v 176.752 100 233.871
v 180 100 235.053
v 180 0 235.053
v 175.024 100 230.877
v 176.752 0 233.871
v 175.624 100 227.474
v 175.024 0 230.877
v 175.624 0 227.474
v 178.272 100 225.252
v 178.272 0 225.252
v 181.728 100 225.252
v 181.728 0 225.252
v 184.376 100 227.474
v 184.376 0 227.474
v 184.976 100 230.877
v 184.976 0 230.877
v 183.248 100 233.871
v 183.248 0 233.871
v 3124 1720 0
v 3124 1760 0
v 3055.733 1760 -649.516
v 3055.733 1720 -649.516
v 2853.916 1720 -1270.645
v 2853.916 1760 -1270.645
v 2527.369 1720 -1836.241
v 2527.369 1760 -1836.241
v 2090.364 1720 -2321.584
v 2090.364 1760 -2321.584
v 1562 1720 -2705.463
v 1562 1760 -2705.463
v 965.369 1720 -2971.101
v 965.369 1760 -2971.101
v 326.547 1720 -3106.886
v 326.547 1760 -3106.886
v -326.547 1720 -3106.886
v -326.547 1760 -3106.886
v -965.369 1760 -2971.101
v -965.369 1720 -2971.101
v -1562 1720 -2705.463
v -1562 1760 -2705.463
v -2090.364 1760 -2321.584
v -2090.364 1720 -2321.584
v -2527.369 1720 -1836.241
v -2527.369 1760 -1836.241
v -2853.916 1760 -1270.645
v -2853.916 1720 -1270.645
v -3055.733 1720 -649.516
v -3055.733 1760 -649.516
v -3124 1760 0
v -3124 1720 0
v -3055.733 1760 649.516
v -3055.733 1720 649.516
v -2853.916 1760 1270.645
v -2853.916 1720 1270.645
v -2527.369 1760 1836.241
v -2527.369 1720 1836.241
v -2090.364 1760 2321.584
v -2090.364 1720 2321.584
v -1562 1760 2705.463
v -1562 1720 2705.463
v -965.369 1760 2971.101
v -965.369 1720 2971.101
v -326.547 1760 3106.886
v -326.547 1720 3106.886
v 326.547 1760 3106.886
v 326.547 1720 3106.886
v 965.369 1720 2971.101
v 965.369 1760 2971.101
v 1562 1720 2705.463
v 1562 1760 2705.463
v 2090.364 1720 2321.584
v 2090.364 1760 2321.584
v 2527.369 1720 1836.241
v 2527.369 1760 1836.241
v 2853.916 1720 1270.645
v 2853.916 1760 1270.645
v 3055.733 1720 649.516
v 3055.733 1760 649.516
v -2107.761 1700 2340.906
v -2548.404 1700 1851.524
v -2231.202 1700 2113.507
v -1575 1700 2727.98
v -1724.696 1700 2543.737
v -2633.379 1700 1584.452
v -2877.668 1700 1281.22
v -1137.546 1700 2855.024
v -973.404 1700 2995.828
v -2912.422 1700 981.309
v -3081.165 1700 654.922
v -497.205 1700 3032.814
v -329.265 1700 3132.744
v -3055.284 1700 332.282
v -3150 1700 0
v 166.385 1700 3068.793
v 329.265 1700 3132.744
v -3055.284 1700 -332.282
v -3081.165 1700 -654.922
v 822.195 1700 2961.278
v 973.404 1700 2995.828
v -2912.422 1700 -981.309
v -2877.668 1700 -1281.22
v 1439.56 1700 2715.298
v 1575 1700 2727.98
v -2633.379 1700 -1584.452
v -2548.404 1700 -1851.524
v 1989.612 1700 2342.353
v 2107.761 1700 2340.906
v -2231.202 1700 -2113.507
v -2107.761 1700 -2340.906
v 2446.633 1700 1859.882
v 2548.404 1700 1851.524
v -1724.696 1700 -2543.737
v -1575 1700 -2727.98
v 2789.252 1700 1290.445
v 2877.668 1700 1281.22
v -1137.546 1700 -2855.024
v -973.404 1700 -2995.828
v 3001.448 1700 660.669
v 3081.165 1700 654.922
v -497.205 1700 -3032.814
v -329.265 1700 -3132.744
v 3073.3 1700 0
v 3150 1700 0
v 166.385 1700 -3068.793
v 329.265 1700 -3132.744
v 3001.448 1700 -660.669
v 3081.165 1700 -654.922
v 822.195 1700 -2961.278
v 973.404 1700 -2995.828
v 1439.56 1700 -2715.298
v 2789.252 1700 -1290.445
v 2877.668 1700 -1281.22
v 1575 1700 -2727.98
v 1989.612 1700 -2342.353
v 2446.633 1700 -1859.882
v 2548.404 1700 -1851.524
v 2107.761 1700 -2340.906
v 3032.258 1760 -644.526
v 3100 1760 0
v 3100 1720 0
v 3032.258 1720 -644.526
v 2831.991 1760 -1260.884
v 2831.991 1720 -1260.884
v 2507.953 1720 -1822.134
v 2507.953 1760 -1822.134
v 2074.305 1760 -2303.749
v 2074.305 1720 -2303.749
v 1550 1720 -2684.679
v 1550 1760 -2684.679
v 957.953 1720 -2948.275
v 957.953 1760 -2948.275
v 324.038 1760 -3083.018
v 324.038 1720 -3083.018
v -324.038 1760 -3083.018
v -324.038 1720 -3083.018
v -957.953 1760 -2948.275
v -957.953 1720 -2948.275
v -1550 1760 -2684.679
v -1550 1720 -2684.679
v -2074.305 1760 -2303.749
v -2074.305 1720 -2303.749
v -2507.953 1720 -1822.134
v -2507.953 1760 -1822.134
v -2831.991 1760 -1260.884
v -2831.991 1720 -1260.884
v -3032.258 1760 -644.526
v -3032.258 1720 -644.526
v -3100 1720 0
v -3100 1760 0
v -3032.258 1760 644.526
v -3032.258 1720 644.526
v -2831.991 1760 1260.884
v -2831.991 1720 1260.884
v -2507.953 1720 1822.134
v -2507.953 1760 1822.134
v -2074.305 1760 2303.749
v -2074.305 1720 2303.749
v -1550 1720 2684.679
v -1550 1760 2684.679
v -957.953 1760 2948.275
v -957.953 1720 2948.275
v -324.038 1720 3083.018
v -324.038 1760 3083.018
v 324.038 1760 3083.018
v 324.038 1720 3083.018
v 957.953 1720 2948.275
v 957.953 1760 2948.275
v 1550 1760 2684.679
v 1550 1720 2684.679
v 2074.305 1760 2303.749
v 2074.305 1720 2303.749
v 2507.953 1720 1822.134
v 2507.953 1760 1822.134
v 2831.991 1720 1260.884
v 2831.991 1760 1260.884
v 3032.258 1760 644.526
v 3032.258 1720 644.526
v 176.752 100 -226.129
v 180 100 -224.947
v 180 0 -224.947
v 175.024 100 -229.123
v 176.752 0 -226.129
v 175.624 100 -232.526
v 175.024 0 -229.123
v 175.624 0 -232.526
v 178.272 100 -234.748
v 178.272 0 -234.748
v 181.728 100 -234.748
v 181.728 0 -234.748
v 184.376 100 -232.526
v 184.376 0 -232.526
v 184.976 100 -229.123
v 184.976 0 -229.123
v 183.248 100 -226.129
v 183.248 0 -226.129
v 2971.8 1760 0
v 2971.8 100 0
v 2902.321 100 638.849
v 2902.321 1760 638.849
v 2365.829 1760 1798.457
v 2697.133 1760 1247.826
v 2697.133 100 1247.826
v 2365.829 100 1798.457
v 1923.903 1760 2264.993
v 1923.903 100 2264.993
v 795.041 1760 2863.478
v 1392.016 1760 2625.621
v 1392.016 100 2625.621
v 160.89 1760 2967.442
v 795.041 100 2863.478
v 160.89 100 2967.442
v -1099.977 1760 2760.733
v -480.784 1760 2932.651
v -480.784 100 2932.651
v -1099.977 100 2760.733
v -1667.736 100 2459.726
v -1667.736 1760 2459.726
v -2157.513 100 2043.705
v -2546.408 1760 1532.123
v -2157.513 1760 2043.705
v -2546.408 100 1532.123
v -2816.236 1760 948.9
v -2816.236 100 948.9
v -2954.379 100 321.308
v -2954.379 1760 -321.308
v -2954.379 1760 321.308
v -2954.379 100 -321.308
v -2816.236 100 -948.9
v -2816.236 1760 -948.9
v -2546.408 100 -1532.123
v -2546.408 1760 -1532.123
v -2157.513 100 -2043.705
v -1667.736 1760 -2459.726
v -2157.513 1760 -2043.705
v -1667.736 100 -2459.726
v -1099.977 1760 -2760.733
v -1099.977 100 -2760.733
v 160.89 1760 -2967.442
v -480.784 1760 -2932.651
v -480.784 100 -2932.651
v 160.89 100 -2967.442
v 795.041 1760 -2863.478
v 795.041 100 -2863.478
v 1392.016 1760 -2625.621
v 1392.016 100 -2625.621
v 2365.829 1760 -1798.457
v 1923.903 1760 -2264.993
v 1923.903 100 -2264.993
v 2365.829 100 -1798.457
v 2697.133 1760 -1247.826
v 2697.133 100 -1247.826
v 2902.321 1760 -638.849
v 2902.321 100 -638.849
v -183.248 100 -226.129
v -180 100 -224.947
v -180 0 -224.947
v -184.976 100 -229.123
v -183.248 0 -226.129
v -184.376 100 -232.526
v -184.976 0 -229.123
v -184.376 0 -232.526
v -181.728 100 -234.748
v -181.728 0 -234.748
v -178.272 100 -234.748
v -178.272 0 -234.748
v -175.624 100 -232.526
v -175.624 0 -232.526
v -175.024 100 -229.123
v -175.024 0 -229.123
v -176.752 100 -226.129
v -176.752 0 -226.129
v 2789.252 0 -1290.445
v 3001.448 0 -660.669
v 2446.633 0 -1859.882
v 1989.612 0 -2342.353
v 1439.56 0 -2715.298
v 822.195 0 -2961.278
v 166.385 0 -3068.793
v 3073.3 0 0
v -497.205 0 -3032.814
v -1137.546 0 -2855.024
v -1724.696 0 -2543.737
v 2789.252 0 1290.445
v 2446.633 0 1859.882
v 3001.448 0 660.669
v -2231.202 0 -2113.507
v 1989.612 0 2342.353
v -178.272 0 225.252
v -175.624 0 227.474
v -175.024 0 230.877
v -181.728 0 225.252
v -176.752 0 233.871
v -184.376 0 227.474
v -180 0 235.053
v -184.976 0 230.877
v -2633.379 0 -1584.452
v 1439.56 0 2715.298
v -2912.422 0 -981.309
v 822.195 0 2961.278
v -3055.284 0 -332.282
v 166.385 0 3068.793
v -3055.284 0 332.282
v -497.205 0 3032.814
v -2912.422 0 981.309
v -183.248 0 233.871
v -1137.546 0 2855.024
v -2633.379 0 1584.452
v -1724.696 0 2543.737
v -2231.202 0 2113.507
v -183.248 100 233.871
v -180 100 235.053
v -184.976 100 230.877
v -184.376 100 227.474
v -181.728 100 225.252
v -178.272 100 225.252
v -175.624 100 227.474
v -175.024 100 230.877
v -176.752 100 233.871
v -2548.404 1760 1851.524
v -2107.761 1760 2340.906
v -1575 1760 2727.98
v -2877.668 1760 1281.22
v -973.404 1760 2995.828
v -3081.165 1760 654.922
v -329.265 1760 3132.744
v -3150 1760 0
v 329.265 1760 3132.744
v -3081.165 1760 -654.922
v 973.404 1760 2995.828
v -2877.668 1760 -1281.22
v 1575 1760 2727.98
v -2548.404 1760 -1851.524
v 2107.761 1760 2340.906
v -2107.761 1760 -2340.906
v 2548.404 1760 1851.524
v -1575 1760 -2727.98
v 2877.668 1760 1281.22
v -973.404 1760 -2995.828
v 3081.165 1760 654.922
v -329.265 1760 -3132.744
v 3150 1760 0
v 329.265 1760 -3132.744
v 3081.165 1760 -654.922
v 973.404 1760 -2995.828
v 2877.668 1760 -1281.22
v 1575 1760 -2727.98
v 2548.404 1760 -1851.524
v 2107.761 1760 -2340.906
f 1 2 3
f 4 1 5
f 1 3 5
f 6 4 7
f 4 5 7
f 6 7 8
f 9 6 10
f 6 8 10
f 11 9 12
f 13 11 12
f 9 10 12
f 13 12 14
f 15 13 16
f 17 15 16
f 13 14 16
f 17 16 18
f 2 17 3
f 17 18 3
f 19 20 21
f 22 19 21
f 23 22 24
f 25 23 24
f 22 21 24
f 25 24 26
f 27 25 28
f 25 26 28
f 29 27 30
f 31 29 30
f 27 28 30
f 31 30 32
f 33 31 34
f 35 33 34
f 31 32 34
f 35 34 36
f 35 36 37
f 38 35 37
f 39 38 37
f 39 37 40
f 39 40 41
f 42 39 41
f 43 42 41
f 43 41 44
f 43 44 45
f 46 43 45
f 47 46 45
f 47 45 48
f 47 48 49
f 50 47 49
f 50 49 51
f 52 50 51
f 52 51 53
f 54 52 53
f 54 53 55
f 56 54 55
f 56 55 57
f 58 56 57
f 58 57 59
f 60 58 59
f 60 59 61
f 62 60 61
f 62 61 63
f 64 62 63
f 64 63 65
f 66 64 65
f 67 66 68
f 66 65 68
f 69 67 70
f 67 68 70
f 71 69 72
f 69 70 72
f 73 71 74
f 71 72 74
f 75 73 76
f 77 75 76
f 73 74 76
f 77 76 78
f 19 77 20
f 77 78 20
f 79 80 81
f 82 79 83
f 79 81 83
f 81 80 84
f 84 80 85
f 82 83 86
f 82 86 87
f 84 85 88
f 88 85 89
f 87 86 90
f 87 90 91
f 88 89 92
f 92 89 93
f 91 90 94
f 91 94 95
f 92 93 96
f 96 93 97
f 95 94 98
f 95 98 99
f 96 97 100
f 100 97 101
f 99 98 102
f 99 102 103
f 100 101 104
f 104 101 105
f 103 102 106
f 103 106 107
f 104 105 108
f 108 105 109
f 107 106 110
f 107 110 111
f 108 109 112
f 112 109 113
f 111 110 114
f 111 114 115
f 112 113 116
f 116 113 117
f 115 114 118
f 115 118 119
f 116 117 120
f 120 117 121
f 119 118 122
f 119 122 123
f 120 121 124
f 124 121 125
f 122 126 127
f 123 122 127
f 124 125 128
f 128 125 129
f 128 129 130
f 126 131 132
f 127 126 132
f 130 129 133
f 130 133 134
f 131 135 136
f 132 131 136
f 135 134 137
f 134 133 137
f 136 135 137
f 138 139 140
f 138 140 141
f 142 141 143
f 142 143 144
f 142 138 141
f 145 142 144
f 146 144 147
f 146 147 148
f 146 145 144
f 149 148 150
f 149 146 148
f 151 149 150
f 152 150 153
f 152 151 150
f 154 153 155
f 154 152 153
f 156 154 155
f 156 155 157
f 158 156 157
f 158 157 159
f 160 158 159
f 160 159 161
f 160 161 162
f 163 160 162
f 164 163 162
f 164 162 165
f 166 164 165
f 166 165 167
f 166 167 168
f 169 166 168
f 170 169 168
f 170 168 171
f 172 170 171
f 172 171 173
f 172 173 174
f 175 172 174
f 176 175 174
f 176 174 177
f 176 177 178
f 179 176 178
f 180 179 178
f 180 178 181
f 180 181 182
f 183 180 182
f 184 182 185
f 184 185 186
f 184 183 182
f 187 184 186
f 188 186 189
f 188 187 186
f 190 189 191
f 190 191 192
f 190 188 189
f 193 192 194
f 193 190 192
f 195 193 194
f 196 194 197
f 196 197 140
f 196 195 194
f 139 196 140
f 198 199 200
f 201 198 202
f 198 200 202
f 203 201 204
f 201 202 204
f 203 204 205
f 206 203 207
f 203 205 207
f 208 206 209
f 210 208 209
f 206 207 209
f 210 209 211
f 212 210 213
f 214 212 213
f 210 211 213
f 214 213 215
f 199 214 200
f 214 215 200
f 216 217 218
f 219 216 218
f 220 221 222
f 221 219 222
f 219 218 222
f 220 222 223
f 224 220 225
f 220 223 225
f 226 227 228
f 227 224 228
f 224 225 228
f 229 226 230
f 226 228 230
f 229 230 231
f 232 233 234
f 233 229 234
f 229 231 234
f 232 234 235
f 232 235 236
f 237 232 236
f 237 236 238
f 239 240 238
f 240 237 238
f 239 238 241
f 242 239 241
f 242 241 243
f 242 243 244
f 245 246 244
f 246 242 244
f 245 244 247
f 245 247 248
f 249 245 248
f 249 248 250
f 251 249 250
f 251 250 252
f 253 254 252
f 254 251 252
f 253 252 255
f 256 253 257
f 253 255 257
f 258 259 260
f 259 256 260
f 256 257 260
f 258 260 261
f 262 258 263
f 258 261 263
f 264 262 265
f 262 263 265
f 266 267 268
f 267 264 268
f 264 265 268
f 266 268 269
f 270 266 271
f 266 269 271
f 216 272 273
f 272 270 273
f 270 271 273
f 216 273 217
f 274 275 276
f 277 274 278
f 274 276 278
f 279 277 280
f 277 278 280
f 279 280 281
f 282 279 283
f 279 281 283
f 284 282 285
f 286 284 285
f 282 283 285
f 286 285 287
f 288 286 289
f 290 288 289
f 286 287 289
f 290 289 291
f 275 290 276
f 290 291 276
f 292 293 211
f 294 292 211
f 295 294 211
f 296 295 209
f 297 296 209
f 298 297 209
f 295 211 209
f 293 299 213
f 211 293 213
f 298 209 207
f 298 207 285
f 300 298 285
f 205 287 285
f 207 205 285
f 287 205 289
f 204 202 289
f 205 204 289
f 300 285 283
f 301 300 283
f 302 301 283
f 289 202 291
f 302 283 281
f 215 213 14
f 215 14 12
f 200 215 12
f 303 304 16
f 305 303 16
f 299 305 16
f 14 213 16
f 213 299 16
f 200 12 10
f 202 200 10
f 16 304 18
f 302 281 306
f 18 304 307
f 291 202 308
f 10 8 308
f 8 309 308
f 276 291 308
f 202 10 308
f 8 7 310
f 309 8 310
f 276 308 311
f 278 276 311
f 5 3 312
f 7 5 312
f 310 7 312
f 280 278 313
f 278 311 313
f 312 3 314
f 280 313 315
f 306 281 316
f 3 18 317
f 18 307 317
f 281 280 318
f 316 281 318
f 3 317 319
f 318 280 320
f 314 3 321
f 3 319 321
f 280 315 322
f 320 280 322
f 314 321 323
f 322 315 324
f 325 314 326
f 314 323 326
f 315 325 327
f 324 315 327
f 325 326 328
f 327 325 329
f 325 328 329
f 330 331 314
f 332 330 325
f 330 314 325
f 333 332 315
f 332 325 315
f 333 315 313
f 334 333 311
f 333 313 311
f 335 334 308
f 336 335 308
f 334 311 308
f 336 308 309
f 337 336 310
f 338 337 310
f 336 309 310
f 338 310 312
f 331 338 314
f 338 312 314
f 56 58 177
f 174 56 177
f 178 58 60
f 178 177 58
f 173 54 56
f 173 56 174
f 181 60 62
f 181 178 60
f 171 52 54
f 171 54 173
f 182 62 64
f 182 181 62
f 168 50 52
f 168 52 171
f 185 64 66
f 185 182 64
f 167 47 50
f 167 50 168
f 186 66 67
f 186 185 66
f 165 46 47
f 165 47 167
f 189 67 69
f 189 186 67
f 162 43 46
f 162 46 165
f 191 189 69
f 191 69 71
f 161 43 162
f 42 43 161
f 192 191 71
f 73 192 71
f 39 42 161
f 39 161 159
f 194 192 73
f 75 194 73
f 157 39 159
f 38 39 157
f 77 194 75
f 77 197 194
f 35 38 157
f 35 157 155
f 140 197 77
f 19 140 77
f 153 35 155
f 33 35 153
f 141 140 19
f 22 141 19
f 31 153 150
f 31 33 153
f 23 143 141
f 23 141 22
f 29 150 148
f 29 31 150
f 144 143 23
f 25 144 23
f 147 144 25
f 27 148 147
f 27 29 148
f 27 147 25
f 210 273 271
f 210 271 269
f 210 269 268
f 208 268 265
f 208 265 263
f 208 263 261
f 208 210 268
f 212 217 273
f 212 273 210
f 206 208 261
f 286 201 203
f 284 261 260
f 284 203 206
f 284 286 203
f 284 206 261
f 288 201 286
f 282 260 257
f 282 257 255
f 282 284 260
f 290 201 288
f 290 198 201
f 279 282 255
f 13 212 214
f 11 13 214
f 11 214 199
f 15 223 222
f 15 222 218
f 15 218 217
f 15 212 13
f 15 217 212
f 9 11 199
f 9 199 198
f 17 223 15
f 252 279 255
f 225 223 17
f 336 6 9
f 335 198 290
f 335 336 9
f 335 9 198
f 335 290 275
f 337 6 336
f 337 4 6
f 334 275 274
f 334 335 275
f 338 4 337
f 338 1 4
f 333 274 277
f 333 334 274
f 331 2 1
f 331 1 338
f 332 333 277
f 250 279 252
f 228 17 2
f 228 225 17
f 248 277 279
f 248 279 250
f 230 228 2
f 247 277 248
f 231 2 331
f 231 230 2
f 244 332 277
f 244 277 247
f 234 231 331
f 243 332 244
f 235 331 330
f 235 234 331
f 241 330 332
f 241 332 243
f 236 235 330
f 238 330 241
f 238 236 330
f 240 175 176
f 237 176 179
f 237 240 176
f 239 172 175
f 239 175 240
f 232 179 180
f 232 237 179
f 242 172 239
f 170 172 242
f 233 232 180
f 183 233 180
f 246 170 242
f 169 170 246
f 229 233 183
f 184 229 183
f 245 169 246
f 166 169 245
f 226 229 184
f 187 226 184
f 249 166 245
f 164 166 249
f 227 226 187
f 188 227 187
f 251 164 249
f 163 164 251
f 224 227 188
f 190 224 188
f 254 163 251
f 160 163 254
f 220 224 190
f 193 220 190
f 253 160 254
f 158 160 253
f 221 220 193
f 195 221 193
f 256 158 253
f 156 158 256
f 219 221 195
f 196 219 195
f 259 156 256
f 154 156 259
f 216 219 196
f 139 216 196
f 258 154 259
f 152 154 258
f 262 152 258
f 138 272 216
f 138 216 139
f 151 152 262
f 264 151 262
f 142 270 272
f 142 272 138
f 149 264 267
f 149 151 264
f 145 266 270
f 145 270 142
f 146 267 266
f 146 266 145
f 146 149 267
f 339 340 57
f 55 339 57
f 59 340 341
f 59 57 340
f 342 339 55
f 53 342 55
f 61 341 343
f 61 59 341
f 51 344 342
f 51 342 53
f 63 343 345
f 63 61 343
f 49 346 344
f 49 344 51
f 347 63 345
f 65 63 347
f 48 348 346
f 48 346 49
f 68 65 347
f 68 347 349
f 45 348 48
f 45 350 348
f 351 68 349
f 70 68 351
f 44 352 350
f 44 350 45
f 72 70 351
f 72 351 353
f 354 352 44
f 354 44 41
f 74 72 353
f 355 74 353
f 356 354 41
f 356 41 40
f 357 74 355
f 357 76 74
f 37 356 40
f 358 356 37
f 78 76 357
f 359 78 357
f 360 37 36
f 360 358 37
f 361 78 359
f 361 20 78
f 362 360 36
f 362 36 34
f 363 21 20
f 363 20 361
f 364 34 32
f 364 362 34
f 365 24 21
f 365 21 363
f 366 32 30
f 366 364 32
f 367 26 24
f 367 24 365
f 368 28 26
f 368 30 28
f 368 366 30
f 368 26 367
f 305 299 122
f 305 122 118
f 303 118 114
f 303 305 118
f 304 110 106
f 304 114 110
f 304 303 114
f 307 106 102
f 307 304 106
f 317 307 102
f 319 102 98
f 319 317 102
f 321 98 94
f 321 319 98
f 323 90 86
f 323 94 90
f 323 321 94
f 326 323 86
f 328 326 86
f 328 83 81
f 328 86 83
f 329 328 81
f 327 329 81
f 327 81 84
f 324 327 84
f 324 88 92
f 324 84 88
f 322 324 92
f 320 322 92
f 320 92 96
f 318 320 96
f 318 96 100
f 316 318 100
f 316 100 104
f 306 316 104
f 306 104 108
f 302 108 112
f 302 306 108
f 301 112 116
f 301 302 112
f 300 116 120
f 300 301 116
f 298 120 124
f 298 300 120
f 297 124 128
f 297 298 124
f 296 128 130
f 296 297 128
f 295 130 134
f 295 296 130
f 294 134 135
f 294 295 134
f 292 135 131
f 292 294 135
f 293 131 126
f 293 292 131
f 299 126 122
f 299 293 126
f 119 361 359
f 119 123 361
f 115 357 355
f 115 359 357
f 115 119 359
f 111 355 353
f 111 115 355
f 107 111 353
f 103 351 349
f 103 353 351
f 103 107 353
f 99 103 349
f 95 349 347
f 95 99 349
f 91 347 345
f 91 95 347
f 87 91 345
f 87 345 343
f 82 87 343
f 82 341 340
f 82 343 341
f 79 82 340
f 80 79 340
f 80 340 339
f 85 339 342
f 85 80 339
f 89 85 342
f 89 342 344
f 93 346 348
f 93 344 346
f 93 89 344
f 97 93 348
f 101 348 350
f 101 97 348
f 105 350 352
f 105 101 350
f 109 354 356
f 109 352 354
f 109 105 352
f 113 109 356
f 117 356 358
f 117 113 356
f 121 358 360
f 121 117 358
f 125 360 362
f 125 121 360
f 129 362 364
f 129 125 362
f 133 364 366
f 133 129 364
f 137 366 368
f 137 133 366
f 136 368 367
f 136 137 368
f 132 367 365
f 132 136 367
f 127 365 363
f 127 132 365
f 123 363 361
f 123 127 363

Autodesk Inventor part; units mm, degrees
ref_plane "YZ Plane" through (0, 0, 0) normal (1, 0, 0) x (0, 1, 0)
ref_plane "XZ Plane" through (0, 0, 0) normal (0, 1, 0) x (-1, 0, 0)
sketch "Sketch1" plane through (0, 0, 0) normal (0, 1, 0) x (-1, 0, 0)
  circle A0 centre (0, 0) radius 3350
  dimension "d1" = 6700
extrude "Extrusion1" add sketch "Sketch1" along normal blind 100
ref_plane "Work Plane3" through (0, 100, 0) normal (0, 1, 0) x (1, 0, 0)
sketch "Sketch5" plane through (0, 100, 0) normal (0, 1, 0) x (1, 0, 0)
  point P0 (180, -230)
  point P1 (-180, -230)
  point P2 (180, 230)
  point P3 (-180, 230)
hole "Hole1" at (180, 100, 230) at (-180, 100, 230) at (180, 100, -230) at (-180, 100, -230) direction (0, -1, 0) diameter 10.106 end through all thread size "M12x1.75" class "6H" standard "ISO Metric profile"
sketch "Sketch6" plane through (0, 100, 0) normal (0, 1, 0) x (1, 0, 0)
  circle A0 centre (0, 0) radius 2971.8
  circle A1 centre (0, 0) radius 3073.3
  circle A2 centre (0, 0) radius 3350 projected
  circle A3 centre (0, 0) radius 3350
  dimension "d19" = 5943.6
  dimension "d20" = 6146.6
extrude "Extrusion5" cut sketch "Sketch6" against normal through all contours A2
extrude "Extrusion6" add sketch "Sketch6" along normal blind 1600 contours A1
ref_plane "Work Plane4" through (0, 1700, 0) normal (0, 1, 0) x (1, 0, 0)
sketch "Sketch7" plane through (0, 1700, 0) normal (0, 1, 0) x (1, 0, 0)
  circle A0 centre (0, 0) radius 3.124
  circle A1 centre (0, 0) radius 3124
  circle A2 centre (0, 0) radius 3100
  circle A3 centre (0, 0) radius 3073.3 projected
  circle A4 centre (0, 0) radius 2971.8
  circle A5 centre (0, 0) radius 3150
extrude "Extrusion7" add sketch "Sketch7" along normal blind 60 contours A1 | A2 | A3 | A5
sketch "Sketch8" plane through (0, 1760, 0) normal (0, 1, 0) x (1, 0, 0)
  circle A0 centre (0, 0) radius 3124
  circle A1 centre (0, 0) radius 3100
extrude "Extrusion8" cut sketch "Sketch8" against normal blind 40
properties part number "DomeFloor"
